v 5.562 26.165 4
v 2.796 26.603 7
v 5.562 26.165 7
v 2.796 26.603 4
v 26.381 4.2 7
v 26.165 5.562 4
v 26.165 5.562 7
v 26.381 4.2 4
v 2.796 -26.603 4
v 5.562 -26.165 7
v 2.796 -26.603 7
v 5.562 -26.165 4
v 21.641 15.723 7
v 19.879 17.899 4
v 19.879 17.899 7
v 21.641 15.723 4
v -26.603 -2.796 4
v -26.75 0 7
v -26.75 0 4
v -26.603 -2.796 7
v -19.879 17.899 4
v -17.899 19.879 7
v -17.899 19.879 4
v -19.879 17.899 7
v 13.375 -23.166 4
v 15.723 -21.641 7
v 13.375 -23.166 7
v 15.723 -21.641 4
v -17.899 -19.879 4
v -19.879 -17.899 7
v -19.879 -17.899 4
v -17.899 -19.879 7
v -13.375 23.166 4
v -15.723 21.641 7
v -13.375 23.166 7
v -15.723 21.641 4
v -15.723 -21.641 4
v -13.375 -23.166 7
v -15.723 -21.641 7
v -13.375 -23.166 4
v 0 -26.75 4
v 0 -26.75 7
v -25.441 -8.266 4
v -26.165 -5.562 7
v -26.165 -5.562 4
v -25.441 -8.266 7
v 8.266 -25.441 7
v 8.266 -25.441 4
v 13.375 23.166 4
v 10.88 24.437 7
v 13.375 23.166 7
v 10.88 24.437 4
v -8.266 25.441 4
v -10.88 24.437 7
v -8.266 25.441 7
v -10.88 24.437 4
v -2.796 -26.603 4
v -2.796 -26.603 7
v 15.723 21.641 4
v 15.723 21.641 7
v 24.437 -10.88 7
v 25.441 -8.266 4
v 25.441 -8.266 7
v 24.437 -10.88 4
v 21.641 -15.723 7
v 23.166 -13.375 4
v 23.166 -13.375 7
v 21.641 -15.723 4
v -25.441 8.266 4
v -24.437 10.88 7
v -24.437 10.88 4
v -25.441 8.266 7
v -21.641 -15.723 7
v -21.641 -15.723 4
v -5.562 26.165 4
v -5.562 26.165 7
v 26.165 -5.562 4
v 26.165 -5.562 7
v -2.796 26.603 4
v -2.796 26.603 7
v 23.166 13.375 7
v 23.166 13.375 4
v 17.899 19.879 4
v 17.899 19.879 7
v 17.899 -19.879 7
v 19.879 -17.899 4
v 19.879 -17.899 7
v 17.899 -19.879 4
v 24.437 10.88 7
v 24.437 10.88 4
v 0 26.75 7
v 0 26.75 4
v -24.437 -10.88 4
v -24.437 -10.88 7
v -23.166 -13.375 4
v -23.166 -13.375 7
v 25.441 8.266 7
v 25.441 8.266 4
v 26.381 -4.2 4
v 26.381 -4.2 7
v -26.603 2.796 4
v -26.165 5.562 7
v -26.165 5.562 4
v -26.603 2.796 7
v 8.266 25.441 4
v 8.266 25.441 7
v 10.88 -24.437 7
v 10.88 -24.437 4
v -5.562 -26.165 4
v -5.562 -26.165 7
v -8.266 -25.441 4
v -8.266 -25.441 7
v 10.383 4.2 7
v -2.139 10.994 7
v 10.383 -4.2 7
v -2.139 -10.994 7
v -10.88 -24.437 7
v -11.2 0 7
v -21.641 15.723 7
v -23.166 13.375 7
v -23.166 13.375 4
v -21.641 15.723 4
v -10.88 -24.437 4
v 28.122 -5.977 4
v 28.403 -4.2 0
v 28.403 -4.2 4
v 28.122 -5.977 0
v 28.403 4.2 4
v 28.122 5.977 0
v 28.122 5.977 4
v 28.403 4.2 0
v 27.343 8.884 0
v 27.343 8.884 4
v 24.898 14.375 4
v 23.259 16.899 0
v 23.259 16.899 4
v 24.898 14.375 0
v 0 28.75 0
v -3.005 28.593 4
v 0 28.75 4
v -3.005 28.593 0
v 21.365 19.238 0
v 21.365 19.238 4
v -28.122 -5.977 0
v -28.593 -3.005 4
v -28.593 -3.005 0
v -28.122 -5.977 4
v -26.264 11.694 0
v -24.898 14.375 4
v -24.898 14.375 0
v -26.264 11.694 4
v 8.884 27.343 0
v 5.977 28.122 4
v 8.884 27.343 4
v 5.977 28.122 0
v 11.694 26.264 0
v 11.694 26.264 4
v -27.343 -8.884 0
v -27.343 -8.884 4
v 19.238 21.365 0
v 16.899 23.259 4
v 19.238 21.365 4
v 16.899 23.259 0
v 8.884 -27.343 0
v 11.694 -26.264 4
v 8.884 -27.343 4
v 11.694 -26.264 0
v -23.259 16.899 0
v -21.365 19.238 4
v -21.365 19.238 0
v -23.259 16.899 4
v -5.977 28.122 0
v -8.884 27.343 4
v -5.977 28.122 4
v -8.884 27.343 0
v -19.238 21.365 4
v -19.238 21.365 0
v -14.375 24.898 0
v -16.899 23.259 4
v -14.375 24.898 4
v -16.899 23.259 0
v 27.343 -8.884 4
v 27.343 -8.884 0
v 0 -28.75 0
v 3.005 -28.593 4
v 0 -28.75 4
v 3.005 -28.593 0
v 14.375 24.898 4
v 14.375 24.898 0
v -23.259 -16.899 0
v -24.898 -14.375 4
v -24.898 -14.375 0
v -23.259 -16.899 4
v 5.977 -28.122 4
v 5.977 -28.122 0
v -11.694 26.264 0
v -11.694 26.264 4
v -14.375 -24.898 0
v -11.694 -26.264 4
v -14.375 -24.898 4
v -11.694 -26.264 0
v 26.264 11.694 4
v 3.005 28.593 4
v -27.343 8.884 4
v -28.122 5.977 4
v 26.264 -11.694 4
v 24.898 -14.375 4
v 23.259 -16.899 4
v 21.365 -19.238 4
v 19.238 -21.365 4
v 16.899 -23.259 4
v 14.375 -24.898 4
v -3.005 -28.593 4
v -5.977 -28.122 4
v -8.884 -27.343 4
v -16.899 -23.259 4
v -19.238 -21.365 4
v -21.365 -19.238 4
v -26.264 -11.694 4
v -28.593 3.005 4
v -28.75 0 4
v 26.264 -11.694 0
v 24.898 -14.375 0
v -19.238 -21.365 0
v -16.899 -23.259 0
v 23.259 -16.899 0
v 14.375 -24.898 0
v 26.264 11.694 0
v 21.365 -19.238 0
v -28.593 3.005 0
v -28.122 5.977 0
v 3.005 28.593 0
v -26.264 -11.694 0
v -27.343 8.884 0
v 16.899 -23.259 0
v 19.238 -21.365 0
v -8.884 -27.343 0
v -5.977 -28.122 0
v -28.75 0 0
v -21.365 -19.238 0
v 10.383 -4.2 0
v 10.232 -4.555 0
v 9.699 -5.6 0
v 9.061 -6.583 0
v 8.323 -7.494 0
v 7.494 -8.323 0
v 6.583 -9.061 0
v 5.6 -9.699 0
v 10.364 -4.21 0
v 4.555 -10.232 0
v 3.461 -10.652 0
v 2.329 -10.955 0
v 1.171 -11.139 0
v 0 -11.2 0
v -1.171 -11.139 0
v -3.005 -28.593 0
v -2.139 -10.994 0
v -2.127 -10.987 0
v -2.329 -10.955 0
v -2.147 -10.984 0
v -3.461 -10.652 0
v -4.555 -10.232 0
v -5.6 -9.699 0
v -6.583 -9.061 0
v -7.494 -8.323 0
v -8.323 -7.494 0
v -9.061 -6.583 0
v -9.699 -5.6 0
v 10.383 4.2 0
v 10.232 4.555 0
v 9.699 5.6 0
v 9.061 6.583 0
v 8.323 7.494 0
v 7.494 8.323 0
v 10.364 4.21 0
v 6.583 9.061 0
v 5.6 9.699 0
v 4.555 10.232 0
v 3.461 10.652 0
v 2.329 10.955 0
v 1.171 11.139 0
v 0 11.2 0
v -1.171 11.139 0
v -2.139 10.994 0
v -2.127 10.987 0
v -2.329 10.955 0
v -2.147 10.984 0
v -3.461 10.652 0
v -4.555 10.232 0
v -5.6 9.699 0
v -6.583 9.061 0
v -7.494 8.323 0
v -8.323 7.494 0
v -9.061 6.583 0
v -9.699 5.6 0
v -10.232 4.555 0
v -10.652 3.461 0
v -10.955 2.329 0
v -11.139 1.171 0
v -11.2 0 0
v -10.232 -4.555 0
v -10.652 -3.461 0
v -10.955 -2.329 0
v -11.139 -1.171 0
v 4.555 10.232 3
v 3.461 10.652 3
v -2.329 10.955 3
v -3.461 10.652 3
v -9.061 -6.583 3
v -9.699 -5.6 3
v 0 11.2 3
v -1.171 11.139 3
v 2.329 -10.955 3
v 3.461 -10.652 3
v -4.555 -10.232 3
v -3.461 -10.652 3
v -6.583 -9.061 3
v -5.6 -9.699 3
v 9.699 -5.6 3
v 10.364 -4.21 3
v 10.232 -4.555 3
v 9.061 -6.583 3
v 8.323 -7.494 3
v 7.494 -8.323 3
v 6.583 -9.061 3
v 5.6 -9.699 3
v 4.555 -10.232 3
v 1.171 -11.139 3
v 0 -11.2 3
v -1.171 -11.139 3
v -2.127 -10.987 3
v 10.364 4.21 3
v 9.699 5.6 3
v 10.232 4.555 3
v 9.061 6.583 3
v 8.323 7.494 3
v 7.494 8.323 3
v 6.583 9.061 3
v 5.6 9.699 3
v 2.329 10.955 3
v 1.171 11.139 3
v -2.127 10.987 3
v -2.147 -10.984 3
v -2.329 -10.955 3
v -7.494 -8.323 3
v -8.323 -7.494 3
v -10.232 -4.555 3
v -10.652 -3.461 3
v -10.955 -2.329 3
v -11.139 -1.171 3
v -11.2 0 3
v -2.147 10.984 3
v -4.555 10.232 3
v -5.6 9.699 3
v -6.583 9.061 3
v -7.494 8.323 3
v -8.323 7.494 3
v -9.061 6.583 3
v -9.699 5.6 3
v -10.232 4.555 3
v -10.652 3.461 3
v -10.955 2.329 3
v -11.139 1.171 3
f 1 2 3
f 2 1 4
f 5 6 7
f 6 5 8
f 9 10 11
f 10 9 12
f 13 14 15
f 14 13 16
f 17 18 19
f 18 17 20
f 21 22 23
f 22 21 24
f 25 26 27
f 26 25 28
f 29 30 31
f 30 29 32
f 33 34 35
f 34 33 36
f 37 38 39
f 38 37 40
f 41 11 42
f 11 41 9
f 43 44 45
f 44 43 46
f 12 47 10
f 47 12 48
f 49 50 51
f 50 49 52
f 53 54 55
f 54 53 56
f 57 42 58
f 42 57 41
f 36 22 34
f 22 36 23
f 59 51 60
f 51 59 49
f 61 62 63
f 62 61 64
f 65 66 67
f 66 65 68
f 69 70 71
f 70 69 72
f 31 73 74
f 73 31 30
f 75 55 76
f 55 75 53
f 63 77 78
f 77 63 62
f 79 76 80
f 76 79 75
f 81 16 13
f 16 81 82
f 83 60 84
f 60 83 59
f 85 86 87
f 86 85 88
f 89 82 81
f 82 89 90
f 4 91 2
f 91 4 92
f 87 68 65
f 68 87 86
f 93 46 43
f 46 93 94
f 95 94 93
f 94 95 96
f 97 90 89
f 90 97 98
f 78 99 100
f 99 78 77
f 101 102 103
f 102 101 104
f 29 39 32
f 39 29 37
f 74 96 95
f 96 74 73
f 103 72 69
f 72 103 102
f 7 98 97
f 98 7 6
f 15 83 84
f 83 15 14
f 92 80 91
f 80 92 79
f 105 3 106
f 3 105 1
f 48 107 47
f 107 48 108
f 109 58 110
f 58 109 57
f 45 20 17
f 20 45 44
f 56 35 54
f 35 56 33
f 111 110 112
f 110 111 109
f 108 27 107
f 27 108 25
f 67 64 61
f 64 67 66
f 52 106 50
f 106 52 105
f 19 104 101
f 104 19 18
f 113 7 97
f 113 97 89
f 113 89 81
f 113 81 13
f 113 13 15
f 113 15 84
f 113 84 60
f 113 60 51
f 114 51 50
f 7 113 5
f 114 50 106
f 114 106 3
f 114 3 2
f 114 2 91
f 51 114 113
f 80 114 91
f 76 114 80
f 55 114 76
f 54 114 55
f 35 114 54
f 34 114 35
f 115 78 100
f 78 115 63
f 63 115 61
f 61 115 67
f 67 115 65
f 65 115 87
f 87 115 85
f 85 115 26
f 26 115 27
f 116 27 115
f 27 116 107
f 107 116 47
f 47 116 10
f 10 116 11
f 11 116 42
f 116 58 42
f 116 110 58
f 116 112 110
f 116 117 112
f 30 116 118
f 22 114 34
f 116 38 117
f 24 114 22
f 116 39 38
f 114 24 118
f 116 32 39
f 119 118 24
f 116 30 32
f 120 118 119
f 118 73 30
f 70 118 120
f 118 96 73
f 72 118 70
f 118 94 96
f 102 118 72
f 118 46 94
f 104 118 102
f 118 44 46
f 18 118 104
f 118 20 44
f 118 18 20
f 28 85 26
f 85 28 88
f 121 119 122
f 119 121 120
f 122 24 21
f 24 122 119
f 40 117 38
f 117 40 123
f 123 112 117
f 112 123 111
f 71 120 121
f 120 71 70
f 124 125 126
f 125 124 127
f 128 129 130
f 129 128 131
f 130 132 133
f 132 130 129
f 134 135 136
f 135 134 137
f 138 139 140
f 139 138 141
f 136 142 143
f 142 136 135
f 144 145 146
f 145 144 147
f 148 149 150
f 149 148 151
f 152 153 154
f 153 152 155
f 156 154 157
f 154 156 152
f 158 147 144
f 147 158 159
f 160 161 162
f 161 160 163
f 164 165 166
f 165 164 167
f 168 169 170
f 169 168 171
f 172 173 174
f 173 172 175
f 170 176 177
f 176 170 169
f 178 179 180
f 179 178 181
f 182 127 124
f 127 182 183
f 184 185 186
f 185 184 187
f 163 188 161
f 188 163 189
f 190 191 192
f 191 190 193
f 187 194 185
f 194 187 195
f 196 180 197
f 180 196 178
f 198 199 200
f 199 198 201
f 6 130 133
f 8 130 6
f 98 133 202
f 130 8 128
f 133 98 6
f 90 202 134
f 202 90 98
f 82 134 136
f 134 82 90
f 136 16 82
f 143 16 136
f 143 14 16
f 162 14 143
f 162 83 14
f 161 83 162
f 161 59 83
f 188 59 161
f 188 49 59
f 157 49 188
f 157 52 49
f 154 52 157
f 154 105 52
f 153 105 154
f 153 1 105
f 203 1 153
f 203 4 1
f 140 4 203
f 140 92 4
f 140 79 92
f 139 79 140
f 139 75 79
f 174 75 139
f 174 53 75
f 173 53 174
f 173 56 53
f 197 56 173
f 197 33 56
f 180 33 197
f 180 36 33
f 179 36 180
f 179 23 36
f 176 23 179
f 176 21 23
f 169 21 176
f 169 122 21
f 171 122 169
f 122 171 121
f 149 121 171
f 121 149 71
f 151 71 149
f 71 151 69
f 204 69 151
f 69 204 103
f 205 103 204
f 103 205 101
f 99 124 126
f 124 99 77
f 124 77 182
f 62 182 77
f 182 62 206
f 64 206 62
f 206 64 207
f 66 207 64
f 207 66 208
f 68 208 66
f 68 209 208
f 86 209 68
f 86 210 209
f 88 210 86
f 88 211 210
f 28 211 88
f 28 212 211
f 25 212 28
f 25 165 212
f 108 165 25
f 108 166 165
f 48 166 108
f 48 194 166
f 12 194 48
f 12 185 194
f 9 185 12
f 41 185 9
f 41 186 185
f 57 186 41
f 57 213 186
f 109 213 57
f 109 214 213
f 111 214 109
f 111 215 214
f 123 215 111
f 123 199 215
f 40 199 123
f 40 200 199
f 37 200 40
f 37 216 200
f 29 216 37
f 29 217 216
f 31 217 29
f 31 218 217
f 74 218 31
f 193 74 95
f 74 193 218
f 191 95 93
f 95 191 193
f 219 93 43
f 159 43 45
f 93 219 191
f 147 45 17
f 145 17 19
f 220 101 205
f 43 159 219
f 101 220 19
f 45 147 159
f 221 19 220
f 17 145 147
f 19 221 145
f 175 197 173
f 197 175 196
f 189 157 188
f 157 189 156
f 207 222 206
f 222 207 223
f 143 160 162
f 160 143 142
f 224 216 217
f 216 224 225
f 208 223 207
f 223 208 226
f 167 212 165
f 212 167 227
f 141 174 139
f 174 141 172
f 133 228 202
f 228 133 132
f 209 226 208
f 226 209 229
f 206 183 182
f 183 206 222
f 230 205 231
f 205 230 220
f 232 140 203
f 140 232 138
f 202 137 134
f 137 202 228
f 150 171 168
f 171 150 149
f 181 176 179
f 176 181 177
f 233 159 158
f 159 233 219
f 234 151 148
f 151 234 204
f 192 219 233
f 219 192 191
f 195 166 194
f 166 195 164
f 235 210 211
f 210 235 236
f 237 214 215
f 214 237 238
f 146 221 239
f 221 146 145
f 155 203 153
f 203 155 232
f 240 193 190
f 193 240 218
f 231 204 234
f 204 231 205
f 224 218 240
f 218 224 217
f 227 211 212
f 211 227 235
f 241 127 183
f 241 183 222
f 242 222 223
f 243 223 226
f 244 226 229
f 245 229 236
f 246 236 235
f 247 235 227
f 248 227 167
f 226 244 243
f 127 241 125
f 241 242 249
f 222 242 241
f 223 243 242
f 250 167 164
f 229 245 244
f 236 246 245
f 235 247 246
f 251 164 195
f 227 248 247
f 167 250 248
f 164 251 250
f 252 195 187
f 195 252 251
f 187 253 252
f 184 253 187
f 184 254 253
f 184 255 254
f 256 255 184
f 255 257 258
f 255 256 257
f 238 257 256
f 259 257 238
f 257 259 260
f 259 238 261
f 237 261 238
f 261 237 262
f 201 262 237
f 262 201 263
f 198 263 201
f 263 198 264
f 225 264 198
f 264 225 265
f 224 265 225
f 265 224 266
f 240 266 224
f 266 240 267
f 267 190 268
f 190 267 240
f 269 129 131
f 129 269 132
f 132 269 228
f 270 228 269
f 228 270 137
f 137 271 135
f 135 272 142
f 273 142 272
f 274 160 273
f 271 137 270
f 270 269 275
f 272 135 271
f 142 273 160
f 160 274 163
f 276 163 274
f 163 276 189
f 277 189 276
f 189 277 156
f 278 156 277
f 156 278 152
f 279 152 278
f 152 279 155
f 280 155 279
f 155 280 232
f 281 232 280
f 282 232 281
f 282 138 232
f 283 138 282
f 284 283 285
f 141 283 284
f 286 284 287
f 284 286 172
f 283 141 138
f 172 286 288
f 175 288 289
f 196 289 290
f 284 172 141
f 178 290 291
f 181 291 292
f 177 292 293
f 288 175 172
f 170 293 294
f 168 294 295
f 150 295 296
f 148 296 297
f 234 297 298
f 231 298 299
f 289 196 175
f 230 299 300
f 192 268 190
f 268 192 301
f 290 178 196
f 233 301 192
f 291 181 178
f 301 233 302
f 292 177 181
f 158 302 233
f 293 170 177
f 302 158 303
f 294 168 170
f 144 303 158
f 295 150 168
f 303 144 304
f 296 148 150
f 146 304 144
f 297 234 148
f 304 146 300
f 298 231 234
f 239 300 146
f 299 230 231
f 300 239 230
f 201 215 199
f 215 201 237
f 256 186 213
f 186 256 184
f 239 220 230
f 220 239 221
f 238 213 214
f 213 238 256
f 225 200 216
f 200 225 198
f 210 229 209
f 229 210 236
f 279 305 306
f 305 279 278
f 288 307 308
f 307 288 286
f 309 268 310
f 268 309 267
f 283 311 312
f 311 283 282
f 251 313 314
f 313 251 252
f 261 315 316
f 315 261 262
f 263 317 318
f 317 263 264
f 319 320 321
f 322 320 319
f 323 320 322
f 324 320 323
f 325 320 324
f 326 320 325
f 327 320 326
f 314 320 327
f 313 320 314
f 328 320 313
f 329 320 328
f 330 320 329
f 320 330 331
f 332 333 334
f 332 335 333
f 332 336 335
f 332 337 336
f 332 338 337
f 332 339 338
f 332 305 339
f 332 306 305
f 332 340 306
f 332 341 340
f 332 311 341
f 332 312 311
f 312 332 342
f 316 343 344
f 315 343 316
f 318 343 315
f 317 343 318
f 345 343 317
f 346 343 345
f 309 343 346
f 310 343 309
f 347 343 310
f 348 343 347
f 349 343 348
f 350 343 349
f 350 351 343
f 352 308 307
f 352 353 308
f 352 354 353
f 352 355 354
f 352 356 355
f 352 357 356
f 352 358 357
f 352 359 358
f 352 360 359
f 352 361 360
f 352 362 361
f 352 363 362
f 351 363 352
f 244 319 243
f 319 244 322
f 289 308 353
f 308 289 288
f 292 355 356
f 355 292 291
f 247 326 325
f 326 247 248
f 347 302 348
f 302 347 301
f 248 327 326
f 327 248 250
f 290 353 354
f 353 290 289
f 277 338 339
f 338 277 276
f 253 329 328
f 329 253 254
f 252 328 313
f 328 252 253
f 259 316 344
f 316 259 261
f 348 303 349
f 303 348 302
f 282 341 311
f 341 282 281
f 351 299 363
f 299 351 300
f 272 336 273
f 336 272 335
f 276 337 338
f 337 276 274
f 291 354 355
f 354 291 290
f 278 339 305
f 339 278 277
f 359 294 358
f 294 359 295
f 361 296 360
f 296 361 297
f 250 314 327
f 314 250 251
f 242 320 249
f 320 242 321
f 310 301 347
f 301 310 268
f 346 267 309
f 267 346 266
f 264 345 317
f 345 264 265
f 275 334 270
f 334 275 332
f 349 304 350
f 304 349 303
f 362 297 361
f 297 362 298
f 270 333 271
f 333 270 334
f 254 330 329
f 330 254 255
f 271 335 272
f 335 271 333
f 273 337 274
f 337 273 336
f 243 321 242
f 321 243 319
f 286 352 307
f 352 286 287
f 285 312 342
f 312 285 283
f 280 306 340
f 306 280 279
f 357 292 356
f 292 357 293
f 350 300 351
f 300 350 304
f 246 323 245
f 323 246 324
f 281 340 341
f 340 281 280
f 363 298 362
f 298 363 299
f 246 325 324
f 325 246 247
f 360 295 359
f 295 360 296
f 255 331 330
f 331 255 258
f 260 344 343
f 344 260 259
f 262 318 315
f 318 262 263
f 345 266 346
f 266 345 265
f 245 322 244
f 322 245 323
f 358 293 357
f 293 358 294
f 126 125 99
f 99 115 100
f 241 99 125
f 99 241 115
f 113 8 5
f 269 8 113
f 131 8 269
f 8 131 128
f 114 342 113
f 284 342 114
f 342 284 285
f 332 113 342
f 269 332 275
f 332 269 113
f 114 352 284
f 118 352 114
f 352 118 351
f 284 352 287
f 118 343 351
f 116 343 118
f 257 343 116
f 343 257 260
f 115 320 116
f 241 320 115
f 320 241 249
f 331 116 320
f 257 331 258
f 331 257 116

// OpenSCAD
// The diameter of the hole at the centre of the spool into which this widget must fit
spool_hole_diameter = 53.5; // [23:60]
// Whether or not the centre of this widget should be open to slide over a bar
closed = false; // [true,false]

/* [Hidden] */

$fa = 6; // minimum angle per fragment
$fs = 1; // minimum length per fragment

M8_r = 8 / 2 + .2;
bearing_r = 22/2 + .2;
spool_overlap = 2;

bearing_h = 3;
interface_h = 1;
spool_h = 3;

weird_angle = asin(M8_r / bearing_r);

function cis(a) = [cos(a), sin(a)];

module thing(closed, diameter)
{
	spool_r = diameter/2;
    translate([0,0,bearing_h	+ interface_h]) difference()
    {
        union()
        {
            translate([0, 0, -interface_h])
                cylinder(r = spool_r, h = spool_h + interface_h);
            translate([0, 0, -interface_h - bearing_h])
                cylinder(r = spool_r + spool_overlap, h = bearing_h + interface_h);
        }

        translate([0, 0, -bearing_h - interface_h - 1])
            cylinder(r = bearing_r, h = bearing_h + 1);
        translate([0, 0, -interface_h - bearing_h - 1])
            linear_extrude(height = spool_h + interface_h + bearing_h + 2)
        if(!closed) {
            // This bit needs to be fixed to cope with holes bigger than 39mm
            polygon(bearing_r * [
                cis(weird_angle) + [100, 0],
                cis(weird_angle),
                cis(90 + weird_angle/2),
                cis(180),
                cis(270 - weird_angle/2),
                cis(-weird_angle),
                cis(-weird_angle) + [100, 0],
            ]);
        } else {
            polygon(bearing_r * [
                cis(0),
                cis(60),
                cis(120),
                cis(180),
                cis(240),
                cis(300),
            ]);
        }
    }
}

thing(closed, spool_hole_diameter);
